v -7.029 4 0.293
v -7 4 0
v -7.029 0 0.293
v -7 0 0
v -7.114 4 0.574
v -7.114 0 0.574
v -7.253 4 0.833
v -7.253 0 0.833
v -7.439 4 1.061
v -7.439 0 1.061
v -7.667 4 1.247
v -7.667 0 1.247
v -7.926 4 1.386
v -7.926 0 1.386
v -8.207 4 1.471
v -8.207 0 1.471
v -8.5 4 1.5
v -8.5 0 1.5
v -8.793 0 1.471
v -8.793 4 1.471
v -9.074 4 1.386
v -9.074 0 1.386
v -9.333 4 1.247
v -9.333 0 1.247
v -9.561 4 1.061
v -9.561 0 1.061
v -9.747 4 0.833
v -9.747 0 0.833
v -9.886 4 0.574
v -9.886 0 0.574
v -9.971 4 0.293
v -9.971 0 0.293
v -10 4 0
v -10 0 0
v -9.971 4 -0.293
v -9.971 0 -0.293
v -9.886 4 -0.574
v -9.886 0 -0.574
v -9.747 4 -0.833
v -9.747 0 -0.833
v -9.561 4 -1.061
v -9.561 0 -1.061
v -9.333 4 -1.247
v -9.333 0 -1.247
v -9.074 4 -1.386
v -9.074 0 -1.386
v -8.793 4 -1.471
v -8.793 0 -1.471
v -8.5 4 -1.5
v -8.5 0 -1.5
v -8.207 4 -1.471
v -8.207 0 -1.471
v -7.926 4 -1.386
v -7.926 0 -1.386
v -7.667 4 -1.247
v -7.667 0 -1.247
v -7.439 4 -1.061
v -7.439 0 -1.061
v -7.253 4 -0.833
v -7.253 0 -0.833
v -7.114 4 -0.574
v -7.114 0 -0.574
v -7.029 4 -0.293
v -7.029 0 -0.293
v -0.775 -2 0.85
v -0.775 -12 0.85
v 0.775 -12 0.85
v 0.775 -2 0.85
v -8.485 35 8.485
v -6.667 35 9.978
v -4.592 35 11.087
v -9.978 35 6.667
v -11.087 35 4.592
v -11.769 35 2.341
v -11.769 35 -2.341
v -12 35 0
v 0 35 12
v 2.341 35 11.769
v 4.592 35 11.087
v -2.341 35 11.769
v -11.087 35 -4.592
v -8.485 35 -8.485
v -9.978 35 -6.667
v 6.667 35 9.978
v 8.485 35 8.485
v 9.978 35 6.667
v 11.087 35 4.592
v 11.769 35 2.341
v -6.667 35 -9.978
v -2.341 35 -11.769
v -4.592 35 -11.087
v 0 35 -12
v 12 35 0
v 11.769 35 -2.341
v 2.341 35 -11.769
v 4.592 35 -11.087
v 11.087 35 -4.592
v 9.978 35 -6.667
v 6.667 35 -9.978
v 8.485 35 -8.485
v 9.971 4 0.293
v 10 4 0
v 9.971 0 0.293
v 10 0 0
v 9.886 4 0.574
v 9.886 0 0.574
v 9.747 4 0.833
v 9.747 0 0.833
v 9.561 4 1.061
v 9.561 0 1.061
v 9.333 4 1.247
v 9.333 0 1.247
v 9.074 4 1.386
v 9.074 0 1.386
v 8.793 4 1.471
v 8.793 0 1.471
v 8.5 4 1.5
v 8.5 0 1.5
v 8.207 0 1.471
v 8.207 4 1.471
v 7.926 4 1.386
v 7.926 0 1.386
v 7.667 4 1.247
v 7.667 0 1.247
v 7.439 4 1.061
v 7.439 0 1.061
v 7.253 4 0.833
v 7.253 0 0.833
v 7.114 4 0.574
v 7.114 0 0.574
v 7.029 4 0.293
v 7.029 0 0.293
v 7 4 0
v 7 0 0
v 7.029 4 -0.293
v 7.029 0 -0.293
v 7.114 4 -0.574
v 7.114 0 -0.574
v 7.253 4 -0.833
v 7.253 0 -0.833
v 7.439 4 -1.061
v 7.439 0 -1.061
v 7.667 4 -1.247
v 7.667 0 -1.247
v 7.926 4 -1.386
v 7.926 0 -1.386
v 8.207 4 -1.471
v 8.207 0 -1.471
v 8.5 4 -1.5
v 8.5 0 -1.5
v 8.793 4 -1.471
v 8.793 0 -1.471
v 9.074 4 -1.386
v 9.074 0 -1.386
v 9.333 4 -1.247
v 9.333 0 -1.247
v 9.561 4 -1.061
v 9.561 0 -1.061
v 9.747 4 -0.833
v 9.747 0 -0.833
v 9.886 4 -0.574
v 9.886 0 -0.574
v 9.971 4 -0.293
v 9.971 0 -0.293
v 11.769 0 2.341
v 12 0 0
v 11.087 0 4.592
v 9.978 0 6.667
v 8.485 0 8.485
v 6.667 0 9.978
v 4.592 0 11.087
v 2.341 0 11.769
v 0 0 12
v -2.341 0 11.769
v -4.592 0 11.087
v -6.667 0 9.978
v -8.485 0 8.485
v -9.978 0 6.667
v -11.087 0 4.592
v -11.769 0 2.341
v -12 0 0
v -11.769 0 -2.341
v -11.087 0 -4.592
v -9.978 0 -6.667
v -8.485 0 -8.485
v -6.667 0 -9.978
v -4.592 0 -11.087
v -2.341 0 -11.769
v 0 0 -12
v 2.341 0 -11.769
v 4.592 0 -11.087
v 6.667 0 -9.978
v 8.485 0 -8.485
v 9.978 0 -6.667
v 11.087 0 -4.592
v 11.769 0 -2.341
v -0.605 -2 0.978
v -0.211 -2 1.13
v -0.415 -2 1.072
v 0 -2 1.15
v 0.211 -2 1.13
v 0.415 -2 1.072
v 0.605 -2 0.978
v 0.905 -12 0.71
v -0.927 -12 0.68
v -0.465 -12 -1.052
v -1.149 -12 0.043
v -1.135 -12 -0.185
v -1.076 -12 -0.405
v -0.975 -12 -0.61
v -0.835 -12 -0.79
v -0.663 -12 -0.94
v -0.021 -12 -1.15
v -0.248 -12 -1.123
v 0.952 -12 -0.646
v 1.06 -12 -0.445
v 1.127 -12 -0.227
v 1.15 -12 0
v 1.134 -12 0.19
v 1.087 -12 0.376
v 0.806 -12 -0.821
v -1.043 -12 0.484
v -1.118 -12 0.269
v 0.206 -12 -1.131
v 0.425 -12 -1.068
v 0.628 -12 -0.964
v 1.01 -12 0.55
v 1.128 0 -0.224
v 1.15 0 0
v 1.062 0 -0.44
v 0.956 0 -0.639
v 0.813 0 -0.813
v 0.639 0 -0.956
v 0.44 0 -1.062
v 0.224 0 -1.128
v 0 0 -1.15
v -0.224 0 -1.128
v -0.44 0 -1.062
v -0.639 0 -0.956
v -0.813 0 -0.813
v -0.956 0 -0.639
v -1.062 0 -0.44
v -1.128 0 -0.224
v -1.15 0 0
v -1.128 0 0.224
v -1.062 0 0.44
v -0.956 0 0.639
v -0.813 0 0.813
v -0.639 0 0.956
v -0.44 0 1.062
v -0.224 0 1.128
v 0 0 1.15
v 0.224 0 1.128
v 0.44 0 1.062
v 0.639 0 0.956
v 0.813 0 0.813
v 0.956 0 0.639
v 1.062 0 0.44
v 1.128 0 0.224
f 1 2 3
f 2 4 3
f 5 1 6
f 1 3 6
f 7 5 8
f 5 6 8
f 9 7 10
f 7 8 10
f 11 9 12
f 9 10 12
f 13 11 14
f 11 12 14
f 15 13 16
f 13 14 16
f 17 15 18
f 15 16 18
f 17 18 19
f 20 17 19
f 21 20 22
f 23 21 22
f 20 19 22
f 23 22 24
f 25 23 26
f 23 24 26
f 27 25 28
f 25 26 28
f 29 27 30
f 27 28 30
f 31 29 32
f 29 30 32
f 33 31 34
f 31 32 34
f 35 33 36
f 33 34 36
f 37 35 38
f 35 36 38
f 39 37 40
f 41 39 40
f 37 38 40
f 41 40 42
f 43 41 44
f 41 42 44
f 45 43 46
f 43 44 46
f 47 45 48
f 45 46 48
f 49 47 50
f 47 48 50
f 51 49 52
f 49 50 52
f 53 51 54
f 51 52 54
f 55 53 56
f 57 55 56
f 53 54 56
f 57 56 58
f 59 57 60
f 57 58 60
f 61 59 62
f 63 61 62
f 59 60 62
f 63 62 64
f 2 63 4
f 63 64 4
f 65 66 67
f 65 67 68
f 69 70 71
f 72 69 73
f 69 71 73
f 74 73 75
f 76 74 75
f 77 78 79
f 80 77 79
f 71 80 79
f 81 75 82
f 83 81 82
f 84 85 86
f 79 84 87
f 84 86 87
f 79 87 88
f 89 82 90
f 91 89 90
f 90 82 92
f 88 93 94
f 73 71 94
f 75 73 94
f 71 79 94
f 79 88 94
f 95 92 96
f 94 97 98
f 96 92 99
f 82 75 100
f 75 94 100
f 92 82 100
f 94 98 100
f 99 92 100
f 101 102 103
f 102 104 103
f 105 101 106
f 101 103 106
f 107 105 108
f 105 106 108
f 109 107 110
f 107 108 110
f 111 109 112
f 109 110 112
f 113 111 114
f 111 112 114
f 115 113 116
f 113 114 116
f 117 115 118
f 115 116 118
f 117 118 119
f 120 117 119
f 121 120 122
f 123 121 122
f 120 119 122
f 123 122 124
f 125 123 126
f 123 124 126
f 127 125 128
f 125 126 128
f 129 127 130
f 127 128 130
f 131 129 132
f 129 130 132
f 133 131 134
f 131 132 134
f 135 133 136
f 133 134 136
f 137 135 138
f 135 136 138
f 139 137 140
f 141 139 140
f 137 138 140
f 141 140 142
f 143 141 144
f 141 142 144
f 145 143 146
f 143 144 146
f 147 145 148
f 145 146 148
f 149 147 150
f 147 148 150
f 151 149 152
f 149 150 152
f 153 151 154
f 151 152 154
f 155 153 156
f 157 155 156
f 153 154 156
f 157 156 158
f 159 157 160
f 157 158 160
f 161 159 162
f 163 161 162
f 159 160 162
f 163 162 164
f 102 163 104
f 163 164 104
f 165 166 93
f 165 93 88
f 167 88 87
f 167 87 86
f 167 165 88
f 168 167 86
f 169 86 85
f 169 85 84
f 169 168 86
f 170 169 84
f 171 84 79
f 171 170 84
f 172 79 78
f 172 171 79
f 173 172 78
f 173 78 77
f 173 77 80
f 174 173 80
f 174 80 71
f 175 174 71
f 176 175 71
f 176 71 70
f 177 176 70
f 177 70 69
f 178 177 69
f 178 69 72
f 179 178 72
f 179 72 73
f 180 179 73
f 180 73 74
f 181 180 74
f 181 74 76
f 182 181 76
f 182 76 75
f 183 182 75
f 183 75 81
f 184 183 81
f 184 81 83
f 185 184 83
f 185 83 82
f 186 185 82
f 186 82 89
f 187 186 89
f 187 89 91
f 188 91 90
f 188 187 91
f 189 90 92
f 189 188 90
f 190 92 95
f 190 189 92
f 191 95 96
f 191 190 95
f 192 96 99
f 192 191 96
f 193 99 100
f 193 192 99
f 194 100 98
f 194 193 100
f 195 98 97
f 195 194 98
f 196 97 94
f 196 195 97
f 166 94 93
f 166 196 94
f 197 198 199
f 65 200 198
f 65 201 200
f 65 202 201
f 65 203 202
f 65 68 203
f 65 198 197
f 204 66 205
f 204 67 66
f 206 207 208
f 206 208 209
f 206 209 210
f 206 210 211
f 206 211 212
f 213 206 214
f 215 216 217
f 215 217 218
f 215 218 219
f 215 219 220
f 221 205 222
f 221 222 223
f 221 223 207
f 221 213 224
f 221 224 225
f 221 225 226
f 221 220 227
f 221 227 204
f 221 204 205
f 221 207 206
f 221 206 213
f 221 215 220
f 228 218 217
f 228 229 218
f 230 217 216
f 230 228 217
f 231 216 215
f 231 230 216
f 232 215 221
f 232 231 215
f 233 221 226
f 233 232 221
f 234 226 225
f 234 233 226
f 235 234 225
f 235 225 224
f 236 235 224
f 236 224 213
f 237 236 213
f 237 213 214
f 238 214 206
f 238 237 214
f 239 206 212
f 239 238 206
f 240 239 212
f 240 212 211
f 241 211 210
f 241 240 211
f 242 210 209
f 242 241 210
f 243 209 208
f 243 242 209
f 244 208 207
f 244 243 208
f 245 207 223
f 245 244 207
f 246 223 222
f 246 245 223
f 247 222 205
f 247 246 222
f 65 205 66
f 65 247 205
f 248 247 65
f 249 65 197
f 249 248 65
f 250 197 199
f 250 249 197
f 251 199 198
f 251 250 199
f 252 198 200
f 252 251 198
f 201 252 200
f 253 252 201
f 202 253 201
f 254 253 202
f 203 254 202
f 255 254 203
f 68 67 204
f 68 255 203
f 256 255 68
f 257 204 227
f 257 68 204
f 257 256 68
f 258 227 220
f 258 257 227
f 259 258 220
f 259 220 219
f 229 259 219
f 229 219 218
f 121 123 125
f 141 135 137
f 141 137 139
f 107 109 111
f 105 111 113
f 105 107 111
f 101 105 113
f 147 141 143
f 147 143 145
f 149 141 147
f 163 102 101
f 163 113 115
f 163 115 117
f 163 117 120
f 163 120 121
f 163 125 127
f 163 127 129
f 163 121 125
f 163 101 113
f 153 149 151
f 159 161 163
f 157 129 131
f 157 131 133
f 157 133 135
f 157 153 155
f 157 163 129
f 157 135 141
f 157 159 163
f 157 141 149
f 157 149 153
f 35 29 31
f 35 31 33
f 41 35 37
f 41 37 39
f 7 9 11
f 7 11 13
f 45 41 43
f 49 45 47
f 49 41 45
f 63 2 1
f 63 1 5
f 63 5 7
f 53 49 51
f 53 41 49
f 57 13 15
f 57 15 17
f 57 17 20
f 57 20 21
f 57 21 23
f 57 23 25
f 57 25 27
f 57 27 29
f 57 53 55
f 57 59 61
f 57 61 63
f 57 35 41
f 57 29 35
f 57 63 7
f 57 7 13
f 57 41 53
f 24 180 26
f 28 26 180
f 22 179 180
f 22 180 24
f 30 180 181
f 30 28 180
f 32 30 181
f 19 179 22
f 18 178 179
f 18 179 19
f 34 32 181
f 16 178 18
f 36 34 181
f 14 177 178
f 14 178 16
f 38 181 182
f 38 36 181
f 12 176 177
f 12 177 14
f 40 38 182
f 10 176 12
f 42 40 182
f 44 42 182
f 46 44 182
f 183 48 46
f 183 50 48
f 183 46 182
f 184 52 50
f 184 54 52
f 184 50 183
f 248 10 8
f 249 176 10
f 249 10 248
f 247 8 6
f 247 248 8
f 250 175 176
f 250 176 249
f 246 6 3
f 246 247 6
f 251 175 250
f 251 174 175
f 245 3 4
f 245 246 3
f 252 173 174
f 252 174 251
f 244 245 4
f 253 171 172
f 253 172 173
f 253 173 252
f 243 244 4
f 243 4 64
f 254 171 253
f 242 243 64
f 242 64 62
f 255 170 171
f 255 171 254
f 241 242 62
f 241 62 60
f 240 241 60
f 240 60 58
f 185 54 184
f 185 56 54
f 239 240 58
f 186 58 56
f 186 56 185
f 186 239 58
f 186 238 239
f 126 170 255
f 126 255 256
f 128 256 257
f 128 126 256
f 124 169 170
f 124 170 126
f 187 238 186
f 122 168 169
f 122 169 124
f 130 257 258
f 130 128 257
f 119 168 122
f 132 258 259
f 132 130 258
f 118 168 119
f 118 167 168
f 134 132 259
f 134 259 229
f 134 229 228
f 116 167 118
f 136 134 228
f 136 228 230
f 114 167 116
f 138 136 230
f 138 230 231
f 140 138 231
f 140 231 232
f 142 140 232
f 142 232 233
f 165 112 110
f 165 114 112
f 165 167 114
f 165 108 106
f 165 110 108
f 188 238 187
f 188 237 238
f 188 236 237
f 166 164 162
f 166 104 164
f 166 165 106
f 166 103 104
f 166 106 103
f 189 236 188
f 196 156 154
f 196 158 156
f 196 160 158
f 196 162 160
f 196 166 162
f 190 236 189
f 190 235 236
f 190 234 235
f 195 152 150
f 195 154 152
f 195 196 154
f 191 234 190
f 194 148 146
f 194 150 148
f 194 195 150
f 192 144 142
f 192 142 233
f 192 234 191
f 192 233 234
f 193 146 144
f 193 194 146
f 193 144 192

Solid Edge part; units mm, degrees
sketch "Sketch1" plane through (0, 0, 0) normal (0, -1, 0) x (1, 0, 0)
  circle A0 centre (0, 0) radius 12
extrude "Protrusion1" add sketch "Sketch1" against normal blind 35
sketch "Sketch2" plane through (0, 0, 0) normal (0, -1, 0) x (1, 0, 0)
  circle A0 centre (-8.5, 0) radius 1.5
  circle A1 centre (8.5, 0) radius 1.5
extrude "ExtrudedCutout_1" cut sketch "Sketch2" against normal blind 4
sketch "Sketch3" plane through (0, 0, 0) normal (0, -1, 0) x (1, 0, 0)
  circle A0 centre (0, 0) radius 1.15
extrude "ExtrudedProtrusion_2" add sketch "Sketch3" along normal blind 12
sketch "Sketch4" plane through (0, 0, 0) normal (1, 0, 0) x (0, 1, 0)
  line L0 (-12, 0.85) -> (-2, 0.85)
  line L1 (-2, 0.85) -> (-2, 1.15)
  line L2 (-12, 1.15) -> (-2, 1.15)
  line L3 (-12, 0.85) -> (-12, 1.15)
extrude "ExtrudedCutout_2" cut sketch "Sketch4" along normal mid plane 5
